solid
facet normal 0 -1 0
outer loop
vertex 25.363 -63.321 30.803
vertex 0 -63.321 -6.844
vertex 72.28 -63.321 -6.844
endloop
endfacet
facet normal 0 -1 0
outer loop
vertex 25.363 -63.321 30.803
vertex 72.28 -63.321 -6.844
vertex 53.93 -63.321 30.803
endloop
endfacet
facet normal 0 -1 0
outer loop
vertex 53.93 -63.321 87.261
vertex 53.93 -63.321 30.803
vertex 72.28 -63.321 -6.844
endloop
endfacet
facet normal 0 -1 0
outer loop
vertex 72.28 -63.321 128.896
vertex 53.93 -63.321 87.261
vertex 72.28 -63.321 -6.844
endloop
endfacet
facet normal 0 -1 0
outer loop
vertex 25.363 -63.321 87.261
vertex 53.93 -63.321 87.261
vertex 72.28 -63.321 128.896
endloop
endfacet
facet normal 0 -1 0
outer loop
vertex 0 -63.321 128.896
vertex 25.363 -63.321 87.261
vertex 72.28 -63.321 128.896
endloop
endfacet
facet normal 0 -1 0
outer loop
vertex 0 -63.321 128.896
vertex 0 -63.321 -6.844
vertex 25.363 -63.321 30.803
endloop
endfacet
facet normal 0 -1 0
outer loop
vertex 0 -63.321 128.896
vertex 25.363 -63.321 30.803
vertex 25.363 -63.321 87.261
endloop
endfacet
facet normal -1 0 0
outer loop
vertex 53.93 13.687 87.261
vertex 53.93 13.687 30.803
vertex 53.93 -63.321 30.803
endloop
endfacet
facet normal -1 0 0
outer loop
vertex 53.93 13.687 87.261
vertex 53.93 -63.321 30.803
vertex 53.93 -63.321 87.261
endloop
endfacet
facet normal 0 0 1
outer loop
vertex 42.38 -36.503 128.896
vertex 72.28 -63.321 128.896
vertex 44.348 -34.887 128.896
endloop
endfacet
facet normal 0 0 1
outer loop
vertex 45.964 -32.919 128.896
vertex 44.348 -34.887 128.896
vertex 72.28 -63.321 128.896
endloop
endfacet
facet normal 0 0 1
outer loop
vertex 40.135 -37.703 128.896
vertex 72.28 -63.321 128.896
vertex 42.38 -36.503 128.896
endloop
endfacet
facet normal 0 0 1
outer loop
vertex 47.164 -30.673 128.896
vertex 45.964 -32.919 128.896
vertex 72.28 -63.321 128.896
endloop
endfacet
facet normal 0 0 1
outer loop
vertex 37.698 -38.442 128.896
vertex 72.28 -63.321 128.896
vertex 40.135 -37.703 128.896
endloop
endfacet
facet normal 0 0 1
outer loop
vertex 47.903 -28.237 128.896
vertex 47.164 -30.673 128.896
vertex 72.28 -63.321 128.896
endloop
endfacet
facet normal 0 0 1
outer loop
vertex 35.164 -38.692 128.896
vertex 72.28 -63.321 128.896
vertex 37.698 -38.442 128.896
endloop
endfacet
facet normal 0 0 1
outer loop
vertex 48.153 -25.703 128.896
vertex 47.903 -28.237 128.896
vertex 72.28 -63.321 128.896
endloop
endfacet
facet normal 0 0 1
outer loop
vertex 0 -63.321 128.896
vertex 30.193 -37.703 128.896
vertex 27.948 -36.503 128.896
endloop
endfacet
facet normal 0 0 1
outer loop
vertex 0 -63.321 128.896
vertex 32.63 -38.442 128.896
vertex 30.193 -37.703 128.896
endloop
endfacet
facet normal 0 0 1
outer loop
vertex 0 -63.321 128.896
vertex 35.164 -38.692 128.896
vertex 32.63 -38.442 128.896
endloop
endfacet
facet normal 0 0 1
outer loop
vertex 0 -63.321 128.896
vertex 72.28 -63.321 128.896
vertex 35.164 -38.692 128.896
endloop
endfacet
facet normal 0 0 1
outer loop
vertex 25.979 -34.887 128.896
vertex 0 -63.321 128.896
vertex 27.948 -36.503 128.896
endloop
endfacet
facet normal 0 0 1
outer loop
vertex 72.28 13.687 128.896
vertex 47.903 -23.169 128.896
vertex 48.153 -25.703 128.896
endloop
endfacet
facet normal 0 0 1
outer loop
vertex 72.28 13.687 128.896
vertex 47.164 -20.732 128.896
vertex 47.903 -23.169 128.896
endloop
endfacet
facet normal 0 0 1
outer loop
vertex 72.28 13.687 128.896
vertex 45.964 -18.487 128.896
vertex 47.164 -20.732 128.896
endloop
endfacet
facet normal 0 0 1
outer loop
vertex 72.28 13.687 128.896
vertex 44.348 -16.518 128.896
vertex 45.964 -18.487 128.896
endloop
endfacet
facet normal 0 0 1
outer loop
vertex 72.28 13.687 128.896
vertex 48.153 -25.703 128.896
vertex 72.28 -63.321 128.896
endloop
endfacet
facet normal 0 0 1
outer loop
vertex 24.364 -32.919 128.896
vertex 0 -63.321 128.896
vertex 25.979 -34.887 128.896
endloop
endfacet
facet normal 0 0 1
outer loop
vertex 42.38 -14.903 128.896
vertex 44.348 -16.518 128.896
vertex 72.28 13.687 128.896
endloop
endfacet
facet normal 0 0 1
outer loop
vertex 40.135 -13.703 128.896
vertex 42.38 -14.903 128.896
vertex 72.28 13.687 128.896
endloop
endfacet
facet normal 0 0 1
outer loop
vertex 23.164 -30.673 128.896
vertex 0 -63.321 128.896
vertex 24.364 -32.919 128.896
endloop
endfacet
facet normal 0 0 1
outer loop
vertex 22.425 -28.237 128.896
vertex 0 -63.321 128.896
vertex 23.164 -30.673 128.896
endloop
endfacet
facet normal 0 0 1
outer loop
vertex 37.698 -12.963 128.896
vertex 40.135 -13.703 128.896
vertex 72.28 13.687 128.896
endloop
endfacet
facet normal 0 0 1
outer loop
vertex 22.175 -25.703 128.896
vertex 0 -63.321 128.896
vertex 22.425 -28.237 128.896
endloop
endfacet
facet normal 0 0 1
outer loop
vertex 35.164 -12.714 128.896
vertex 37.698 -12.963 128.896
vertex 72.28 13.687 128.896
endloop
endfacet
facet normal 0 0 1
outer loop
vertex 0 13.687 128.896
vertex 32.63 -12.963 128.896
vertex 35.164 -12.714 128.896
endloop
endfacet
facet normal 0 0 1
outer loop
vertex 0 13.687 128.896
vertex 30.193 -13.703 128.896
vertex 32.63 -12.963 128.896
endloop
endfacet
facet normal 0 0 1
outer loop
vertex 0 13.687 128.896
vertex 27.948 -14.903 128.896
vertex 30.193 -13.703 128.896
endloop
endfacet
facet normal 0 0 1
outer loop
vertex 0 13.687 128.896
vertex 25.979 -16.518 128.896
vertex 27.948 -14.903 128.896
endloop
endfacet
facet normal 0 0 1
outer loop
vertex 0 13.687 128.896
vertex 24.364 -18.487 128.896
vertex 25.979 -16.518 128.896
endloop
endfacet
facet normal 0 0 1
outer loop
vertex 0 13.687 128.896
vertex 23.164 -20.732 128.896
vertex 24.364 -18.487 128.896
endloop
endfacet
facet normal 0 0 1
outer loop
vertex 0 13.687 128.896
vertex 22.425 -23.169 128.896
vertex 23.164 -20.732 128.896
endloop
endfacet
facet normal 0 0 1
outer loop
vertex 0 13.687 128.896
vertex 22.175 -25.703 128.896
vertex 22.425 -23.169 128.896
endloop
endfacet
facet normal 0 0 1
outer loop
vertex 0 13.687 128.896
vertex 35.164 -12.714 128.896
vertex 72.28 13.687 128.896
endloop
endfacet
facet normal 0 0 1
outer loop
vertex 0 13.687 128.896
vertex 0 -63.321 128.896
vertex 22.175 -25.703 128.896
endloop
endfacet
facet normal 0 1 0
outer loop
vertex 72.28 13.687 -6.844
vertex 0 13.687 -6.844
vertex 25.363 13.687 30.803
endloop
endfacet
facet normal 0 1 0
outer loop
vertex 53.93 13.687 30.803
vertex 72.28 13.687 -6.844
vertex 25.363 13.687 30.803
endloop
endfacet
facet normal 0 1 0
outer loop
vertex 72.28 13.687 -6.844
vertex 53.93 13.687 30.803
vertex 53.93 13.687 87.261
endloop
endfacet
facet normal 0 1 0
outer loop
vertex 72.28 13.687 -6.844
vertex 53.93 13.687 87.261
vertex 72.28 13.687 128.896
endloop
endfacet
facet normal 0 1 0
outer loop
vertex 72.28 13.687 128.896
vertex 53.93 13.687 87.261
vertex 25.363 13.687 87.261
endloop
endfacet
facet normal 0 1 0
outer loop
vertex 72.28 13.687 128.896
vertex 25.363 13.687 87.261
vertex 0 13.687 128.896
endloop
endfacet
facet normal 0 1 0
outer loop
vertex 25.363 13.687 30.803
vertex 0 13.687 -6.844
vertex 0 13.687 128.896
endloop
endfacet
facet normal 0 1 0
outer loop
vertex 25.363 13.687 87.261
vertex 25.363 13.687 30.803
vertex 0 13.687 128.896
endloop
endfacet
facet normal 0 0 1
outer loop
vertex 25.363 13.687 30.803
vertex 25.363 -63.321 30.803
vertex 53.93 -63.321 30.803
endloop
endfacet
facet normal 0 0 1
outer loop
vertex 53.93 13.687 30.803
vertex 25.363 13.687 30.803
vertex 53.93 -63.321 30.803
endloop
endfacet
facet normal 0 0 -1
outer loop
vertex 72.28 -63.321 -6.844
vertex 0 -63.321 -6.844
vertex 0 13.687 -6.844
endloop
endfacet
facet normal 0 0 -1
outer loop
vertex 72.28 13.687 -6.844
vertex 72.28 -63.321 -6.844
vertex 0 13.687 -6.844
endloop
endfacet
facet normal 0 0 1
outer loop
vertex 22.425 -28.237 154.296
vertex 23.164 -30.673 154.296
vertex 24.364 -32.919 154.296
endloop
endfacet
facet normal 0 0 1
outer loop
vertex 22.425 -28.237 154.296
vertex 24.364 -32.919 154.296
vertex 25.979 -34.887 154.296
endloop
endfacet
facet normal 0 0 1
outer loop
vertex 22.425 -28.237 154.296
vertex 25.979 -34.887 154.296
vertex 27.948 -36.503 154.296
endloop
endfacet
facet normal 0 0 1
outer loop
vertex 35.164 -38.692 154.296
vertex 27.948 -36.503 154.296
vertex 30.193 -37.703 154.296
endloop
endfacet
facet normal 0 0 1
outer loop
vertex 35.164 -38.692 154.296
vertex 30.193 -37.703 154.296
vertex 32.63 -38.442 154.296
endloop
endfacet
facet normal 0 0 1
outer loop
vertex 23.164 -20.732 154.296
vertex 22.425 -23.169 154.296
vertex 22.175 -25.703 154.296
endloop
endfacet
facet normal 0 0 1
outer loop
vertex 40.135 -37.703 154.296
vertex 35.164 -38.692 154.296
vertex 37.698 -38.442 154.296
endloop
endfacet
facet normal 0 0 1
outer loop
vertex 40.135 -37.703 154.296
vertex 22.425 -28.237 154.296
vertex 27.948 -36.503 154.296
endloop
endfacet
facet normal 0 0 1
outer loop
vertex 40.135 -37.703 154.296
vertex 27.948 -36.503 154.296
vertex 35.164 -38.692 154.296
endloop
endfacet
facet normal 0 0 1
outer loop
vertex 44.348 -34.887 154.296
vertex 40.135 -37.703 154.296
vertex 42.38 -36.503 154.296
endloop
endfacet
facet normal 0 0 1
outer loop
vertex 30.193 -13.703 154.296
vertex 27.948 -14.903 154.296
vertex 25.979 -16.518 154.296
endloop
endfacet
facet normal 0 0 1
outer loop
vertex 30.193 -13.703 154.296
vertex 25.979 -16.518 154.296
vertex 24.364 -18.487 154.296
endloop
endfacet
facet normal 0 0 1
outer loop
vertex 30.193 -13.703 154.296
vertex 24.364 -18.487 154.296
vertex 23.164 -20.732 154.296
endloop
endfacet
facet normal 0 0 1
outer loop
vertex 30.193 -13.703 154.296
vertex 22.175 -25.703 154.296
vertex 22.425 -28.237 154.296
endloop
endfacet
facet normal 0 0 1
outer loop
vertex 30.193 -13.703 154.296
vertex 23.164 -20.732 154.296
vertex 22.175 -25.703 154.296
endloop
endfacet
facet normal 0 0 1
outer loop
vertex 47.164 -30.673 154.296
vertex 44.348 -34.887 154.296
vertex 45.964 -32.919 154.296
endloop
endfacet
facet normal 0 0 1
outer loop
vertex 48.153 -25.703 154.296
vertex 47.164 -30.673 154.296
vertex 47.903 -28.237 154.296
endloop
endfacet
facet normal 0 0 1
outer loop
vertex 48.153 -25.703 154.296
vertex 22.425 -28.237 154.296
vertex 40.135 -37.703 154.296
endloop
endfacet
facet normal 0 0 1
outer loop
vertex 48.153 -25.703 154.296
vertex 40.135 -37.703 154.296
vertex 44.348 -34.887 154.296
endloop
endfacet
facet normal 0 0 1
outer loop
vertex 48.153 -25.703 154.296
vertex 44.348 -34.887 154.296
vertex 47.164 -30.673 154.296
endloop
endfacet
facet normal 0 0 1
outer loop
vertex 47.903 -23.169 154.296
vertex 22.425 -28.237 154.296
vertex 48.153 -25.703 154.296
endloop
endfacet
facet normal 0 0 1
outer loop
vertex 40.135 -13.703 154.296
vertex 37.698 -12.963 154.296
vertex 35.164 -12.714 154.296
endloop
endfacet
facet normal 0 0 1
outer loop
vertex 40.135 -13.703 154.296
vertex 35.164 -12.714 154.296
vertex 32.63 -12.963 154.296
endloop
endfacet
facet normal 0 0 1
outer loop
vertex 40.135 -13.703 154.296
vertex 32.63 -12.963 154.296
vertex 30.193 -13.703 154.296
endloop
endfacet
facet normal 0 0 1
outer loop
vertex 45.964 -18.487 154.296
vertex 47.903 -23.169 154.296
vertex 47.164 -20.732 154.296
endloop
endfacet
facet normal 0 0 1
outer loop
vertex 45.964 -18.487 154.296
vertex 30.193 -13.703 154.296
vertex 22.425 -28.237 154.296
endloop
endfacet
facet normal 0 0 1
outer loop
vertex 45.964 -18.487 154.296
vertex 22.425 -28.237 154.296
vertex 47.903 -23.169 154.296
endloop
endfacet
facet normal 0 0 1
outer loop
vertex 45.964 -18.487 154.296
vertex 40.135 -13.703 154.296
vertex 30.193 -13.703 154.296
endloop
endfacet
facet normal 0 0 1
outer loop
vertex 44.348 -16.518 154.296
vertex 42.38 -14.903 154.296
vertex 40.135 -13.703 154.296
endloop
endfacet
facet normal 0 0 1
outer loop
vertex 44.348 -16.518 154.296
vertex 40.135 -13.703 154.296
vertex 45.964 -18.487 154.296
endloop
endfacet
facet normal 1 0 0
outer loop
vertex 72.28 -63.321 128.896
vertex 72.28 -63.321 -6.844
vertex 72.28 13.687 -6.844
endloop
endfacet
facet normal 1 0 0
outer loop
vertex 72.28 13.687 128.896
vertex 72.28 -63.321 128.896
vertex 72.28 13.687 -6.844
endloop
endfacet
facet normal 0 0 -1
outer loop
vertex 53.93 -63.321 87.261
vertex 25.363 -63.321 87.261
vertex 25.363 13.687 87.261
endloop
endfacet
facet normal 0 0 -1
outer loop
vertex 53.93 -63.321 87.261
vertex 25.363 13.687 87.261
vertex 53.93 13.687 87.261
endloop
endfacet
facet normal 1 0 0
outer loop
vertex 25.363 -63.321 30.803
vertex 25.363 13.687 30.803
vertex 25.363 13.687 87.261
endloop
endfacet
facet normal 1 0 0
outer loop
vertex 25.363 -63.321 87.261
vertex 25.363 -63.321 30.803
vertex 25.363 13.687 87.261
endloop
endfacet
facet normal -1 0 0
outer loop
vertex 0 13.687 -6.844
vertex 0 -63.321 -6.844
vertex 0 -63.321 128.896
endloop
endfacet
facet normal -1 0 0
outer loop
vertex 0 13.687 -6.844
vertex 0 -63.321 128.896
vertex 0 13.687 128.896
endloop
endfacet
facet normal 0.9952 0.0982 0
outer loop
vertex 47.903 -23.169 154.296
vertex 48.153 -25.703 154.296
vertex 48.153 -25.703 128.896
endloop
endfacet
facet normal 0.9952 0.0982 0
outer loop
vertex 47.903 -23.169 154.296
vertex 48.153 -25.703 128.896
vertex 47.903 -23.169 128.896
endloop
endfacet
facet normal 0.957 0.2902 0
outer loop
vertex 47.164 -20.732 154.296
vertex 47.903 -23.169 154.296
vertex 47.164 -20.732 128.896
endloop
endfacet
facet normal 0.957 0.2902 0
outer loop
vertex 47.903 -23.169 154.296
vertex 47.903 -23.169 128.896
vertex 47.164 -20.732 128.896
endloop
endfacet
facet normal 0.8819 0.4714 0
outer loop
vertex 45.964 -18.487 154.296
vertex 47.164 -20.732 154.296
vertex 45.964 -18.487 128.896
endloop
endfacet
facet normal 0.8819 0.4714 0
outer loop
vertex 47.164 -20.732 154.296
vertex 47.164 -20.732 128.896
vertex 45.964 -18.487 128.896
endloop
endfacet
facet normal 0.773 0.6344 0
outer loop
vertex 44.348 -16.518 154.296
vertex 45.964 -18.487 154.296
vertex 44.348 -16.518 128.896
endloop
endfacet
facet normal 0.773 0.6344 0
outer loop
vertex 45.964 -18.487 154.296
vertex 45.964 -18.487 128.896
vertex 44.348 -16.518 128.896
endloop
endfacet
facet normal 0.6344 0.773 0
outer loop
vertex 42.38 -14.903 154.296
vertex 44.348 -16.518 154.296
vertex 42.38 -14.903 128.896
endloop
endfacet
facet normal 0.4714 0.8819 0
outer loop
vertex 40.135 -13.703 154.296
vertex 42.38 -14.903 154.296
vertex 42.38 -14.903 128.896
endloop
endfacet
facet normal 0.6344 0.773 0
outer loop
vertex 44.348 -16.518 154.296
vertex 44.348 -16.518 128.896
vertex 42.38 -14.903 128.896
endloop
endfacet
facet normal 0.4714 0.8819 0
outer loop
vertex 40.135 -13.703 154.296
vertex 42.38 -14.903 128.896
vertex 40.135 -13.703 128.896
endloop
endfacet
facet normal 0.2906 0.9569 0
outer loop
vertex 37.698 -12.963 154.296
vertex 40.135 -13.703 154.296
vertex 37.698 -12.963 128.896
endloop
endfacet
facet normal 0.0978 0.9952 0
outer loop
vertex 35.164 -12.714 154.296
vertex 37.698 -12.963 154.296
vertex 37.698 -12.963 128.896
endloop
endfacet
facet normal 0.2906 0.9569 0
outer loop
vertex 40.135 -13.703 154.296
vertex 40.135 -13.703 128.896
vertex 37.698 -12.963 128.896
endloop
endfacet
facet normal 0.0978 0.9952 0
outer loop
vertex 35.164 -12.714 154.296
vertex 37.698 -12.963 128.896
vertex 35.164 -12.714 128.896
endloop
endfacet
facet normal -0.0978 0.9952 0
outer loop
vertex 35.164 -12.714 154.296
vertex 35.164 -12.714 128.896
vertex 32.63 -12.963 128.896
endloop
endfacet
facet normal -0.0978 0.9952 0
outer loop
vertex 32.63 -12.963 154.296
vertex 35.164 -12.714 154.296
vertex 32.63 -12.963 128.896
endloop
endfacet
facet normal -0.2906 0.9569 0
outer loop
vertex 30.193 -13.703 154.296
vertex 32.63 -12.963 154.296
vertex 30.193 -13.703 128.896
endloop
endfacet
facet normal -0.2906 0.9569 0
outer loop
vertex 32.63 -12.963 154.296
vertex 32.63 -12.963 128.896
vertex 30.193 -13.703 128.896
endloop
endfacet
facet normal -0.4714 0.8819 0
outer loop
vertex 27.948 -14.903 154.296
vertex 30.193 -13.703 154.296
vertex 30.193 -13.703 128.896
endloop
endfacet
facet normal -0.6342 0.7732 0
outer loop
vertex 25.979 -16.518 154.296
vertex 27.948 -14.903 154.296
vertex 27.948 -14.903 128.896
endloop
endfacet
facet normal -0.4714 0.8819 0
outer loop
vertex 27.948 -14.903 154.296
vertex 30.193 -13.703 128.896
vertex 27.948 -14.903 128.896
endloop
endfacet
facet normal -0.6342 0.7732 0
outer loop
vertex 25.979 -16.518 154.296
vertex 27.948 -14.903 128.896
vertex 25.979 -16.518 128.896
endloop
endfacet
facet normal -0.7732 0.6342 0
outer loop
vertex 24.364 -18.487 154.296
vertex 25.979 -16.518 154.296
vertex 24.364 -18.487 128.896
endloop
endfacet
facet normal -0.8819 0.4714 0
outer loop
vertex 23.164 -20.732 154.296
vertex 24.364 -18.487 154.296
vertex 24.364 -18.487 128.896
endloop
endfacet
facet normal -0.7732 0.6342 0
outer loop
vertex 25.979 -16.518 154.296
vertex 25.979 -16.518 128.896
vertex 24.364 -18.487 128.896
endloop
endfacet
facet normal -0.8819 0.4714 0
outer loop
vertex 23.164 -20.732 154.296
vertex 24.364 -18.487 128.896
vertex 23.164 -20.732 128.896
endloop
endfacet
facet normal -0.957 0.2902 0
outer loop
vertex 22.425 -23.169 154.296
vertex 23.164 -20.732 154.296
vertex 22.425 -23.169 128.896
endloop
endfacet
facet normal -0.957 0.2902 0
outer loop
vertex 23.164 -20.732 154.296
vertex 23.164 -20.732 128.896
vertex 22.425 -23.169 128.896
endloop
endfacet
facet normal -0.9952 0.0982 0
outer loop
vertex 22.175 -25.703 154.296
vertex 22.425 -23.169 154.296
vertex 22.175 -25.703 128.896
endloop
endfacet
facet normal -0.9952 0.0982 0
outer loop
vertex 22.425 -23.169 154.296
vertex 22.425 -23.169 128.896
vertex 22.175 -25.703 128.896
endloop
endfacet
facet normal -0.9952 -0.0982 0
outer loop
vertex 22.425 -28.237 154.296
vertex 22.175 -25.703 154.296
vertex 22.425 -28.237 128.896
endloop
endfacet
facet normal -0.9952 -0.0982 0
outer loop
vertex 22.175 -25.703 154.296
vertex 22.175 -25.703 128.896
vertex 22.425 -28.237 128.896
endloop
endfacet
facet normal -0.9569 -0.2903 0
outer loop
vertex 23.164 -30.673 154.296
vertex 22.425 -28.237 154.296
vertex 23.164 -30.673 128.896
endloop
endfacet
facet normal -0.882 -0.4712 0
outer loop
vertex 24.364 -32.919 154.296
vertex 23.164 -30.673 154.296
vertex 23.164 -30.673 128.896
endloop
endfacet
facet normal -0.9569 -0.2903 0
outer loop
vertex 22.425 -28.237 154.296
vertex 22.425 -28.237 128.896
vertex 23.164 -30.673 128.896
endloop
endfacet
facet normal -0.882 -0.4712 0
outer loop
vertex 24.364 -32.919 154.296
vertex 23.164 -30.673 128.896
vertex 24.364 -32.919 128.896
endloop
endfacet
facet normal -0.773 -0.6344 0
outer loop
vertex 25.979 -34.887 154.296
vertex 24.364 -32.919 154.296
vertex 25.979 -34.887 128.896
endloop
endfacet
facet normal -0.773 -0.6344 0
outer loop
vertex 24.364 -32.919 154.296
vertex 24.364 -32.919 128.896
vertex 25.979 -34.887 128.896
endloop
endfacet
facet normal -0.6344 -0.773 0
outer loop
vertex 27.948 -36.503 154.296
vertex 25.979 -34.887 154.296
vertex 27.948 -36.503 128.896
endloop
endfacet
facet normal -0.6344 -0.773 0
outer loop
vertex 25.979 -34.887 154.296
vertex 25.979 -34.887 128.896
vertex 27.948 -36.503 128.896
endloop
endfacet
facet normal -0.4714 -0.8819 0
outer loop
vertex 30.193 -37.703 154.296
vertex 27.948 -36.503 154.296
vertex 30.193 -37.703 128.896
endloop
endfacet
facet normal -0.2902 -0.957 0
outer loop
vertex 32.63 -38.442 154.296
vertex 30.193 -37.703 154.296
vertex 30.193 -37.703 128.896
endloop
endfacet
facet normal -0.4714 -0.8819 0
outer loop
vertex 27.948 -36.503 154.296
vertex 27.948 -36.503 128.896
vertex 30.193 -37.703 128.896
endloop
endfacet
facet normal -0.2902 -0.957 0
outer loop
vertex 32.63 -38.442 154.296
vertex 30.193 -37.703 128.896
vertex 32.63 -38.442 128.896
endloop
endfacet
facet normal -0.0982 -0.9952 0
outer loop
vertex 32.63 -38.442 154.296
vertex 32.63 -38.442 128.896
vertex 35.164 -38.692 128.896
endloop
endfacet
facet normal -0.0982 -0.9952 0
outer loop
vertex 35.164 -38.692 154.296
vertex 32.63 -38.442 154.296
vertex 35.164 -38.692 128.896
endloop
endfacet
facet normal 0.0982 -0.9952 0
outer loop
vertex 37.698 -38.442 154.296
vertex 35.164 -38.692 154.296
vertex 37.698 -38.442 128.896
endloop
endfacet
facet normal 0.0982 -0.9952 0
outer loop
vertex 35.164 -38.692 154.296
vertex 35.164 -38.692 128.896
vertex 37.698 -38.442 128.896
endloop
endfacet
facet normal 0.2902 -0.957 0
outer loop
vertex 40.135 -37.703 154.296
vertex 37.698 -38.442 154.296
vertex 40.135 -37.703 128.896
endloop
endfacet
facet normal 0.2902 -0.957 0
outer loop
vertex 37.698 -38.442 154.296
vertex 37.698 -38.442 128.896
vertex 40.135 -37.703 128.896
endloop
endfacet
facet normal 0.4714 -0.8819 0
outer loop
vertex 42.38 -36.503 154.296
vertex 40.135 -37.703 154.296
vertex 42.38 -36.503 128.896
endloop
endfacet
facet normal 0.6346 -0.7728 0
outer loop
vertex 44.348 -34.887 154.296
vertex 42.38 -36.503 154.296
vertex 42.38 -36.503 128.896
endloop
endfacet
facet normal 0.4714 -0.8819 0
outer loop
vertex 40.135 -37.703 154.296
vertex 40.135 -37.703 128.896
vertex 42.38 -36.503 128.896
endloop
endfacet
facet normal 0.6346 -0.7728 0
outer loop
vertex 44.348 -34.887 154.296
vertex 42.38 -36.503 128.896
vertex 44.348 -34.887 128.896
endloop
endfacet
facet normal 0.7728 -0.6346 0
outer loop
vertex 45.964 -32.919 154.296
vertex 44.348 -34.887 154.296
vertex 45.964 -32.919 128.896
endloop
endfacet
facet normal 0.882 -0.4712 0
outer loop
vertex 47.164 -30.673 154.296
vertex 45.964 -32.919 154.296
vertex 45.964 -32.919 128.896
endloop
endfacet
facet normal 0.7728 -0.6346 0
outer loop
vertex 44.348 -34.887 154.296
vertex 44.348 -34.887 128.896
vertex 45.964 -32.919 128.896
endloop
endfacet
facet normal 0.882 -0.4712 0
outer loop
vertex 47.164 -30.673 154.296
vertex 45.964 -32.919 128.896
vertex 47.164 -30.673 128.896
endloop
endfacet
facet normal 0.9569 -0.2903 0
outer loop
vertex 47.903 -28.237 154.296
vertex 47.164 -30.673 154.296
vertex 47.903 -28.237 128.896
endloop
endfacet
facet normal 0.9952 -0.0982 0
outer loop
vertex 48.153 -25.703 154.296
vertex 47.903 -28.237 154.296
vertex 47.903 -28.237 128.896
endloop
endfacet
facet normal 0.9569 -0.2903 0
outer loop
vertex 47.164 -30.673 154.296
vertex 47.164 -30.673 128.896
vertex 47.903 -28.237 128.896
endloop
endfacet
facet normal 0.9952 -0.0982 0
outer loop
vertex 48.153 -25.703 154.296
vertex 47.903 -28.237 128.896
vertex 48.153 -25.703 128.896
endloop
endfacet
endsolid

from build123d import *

# Parameters (mm, degrees)
F0_W     = 77.007651329
F0_H     = 135.7397735119
F1_DEPTH = 72.2800772637
F2_R     = 12.98884786
F3_DEPTH = 25.4
F4_W     = 22.6057656109
F4_H     = 36.8559285998
F5_DEPTH = 49.8851463199
F6_W     = 28.5666175187
F6_H     = 56.4576983452
F7_DEPTH = 77.007651329


with BuildPart() as f1:
    # F0 (on Right) → F1 (new body)
    with BuildSketch(Plane.YZ):
        with Locations((-24.8167514801, 61.0263496637)):
            Rectangle(F0_W, F0_H)
    extrude(amount=F1_DEPTH)

    # F2 (on face) → F3 (join)
    with BuildSketch(Plane.XY.offset(128.8962364197)):
        with Locations((35.1639688015, -25.7027596235)):
            Circle(F2_R)
    extrude(amount=F3_DEPTH)

    # F4 (on face) → F5 (cut)
    with BuildSketch(Plane.YZ.offset(72.2800772637)):
        with Locations((-26.0762441903, 56.855943054)):
            Rectangle(F4_W, F4_H)
    extrude(amount=F5_DEPTH, mode=Mode.SUBTRACT)

    # F6 (on face) → F7 (cut, through all)
    with BuildSketch(Plane.XZ.offset(63.3205771446)):
        with Locations((39.6464411169, 59.0323209763)):
            Rectangle(F6_W, F6_H)
    extrude(amount=-F7_DEPTH, mode=Mode.SUBTRACT)


solid = f1.part
